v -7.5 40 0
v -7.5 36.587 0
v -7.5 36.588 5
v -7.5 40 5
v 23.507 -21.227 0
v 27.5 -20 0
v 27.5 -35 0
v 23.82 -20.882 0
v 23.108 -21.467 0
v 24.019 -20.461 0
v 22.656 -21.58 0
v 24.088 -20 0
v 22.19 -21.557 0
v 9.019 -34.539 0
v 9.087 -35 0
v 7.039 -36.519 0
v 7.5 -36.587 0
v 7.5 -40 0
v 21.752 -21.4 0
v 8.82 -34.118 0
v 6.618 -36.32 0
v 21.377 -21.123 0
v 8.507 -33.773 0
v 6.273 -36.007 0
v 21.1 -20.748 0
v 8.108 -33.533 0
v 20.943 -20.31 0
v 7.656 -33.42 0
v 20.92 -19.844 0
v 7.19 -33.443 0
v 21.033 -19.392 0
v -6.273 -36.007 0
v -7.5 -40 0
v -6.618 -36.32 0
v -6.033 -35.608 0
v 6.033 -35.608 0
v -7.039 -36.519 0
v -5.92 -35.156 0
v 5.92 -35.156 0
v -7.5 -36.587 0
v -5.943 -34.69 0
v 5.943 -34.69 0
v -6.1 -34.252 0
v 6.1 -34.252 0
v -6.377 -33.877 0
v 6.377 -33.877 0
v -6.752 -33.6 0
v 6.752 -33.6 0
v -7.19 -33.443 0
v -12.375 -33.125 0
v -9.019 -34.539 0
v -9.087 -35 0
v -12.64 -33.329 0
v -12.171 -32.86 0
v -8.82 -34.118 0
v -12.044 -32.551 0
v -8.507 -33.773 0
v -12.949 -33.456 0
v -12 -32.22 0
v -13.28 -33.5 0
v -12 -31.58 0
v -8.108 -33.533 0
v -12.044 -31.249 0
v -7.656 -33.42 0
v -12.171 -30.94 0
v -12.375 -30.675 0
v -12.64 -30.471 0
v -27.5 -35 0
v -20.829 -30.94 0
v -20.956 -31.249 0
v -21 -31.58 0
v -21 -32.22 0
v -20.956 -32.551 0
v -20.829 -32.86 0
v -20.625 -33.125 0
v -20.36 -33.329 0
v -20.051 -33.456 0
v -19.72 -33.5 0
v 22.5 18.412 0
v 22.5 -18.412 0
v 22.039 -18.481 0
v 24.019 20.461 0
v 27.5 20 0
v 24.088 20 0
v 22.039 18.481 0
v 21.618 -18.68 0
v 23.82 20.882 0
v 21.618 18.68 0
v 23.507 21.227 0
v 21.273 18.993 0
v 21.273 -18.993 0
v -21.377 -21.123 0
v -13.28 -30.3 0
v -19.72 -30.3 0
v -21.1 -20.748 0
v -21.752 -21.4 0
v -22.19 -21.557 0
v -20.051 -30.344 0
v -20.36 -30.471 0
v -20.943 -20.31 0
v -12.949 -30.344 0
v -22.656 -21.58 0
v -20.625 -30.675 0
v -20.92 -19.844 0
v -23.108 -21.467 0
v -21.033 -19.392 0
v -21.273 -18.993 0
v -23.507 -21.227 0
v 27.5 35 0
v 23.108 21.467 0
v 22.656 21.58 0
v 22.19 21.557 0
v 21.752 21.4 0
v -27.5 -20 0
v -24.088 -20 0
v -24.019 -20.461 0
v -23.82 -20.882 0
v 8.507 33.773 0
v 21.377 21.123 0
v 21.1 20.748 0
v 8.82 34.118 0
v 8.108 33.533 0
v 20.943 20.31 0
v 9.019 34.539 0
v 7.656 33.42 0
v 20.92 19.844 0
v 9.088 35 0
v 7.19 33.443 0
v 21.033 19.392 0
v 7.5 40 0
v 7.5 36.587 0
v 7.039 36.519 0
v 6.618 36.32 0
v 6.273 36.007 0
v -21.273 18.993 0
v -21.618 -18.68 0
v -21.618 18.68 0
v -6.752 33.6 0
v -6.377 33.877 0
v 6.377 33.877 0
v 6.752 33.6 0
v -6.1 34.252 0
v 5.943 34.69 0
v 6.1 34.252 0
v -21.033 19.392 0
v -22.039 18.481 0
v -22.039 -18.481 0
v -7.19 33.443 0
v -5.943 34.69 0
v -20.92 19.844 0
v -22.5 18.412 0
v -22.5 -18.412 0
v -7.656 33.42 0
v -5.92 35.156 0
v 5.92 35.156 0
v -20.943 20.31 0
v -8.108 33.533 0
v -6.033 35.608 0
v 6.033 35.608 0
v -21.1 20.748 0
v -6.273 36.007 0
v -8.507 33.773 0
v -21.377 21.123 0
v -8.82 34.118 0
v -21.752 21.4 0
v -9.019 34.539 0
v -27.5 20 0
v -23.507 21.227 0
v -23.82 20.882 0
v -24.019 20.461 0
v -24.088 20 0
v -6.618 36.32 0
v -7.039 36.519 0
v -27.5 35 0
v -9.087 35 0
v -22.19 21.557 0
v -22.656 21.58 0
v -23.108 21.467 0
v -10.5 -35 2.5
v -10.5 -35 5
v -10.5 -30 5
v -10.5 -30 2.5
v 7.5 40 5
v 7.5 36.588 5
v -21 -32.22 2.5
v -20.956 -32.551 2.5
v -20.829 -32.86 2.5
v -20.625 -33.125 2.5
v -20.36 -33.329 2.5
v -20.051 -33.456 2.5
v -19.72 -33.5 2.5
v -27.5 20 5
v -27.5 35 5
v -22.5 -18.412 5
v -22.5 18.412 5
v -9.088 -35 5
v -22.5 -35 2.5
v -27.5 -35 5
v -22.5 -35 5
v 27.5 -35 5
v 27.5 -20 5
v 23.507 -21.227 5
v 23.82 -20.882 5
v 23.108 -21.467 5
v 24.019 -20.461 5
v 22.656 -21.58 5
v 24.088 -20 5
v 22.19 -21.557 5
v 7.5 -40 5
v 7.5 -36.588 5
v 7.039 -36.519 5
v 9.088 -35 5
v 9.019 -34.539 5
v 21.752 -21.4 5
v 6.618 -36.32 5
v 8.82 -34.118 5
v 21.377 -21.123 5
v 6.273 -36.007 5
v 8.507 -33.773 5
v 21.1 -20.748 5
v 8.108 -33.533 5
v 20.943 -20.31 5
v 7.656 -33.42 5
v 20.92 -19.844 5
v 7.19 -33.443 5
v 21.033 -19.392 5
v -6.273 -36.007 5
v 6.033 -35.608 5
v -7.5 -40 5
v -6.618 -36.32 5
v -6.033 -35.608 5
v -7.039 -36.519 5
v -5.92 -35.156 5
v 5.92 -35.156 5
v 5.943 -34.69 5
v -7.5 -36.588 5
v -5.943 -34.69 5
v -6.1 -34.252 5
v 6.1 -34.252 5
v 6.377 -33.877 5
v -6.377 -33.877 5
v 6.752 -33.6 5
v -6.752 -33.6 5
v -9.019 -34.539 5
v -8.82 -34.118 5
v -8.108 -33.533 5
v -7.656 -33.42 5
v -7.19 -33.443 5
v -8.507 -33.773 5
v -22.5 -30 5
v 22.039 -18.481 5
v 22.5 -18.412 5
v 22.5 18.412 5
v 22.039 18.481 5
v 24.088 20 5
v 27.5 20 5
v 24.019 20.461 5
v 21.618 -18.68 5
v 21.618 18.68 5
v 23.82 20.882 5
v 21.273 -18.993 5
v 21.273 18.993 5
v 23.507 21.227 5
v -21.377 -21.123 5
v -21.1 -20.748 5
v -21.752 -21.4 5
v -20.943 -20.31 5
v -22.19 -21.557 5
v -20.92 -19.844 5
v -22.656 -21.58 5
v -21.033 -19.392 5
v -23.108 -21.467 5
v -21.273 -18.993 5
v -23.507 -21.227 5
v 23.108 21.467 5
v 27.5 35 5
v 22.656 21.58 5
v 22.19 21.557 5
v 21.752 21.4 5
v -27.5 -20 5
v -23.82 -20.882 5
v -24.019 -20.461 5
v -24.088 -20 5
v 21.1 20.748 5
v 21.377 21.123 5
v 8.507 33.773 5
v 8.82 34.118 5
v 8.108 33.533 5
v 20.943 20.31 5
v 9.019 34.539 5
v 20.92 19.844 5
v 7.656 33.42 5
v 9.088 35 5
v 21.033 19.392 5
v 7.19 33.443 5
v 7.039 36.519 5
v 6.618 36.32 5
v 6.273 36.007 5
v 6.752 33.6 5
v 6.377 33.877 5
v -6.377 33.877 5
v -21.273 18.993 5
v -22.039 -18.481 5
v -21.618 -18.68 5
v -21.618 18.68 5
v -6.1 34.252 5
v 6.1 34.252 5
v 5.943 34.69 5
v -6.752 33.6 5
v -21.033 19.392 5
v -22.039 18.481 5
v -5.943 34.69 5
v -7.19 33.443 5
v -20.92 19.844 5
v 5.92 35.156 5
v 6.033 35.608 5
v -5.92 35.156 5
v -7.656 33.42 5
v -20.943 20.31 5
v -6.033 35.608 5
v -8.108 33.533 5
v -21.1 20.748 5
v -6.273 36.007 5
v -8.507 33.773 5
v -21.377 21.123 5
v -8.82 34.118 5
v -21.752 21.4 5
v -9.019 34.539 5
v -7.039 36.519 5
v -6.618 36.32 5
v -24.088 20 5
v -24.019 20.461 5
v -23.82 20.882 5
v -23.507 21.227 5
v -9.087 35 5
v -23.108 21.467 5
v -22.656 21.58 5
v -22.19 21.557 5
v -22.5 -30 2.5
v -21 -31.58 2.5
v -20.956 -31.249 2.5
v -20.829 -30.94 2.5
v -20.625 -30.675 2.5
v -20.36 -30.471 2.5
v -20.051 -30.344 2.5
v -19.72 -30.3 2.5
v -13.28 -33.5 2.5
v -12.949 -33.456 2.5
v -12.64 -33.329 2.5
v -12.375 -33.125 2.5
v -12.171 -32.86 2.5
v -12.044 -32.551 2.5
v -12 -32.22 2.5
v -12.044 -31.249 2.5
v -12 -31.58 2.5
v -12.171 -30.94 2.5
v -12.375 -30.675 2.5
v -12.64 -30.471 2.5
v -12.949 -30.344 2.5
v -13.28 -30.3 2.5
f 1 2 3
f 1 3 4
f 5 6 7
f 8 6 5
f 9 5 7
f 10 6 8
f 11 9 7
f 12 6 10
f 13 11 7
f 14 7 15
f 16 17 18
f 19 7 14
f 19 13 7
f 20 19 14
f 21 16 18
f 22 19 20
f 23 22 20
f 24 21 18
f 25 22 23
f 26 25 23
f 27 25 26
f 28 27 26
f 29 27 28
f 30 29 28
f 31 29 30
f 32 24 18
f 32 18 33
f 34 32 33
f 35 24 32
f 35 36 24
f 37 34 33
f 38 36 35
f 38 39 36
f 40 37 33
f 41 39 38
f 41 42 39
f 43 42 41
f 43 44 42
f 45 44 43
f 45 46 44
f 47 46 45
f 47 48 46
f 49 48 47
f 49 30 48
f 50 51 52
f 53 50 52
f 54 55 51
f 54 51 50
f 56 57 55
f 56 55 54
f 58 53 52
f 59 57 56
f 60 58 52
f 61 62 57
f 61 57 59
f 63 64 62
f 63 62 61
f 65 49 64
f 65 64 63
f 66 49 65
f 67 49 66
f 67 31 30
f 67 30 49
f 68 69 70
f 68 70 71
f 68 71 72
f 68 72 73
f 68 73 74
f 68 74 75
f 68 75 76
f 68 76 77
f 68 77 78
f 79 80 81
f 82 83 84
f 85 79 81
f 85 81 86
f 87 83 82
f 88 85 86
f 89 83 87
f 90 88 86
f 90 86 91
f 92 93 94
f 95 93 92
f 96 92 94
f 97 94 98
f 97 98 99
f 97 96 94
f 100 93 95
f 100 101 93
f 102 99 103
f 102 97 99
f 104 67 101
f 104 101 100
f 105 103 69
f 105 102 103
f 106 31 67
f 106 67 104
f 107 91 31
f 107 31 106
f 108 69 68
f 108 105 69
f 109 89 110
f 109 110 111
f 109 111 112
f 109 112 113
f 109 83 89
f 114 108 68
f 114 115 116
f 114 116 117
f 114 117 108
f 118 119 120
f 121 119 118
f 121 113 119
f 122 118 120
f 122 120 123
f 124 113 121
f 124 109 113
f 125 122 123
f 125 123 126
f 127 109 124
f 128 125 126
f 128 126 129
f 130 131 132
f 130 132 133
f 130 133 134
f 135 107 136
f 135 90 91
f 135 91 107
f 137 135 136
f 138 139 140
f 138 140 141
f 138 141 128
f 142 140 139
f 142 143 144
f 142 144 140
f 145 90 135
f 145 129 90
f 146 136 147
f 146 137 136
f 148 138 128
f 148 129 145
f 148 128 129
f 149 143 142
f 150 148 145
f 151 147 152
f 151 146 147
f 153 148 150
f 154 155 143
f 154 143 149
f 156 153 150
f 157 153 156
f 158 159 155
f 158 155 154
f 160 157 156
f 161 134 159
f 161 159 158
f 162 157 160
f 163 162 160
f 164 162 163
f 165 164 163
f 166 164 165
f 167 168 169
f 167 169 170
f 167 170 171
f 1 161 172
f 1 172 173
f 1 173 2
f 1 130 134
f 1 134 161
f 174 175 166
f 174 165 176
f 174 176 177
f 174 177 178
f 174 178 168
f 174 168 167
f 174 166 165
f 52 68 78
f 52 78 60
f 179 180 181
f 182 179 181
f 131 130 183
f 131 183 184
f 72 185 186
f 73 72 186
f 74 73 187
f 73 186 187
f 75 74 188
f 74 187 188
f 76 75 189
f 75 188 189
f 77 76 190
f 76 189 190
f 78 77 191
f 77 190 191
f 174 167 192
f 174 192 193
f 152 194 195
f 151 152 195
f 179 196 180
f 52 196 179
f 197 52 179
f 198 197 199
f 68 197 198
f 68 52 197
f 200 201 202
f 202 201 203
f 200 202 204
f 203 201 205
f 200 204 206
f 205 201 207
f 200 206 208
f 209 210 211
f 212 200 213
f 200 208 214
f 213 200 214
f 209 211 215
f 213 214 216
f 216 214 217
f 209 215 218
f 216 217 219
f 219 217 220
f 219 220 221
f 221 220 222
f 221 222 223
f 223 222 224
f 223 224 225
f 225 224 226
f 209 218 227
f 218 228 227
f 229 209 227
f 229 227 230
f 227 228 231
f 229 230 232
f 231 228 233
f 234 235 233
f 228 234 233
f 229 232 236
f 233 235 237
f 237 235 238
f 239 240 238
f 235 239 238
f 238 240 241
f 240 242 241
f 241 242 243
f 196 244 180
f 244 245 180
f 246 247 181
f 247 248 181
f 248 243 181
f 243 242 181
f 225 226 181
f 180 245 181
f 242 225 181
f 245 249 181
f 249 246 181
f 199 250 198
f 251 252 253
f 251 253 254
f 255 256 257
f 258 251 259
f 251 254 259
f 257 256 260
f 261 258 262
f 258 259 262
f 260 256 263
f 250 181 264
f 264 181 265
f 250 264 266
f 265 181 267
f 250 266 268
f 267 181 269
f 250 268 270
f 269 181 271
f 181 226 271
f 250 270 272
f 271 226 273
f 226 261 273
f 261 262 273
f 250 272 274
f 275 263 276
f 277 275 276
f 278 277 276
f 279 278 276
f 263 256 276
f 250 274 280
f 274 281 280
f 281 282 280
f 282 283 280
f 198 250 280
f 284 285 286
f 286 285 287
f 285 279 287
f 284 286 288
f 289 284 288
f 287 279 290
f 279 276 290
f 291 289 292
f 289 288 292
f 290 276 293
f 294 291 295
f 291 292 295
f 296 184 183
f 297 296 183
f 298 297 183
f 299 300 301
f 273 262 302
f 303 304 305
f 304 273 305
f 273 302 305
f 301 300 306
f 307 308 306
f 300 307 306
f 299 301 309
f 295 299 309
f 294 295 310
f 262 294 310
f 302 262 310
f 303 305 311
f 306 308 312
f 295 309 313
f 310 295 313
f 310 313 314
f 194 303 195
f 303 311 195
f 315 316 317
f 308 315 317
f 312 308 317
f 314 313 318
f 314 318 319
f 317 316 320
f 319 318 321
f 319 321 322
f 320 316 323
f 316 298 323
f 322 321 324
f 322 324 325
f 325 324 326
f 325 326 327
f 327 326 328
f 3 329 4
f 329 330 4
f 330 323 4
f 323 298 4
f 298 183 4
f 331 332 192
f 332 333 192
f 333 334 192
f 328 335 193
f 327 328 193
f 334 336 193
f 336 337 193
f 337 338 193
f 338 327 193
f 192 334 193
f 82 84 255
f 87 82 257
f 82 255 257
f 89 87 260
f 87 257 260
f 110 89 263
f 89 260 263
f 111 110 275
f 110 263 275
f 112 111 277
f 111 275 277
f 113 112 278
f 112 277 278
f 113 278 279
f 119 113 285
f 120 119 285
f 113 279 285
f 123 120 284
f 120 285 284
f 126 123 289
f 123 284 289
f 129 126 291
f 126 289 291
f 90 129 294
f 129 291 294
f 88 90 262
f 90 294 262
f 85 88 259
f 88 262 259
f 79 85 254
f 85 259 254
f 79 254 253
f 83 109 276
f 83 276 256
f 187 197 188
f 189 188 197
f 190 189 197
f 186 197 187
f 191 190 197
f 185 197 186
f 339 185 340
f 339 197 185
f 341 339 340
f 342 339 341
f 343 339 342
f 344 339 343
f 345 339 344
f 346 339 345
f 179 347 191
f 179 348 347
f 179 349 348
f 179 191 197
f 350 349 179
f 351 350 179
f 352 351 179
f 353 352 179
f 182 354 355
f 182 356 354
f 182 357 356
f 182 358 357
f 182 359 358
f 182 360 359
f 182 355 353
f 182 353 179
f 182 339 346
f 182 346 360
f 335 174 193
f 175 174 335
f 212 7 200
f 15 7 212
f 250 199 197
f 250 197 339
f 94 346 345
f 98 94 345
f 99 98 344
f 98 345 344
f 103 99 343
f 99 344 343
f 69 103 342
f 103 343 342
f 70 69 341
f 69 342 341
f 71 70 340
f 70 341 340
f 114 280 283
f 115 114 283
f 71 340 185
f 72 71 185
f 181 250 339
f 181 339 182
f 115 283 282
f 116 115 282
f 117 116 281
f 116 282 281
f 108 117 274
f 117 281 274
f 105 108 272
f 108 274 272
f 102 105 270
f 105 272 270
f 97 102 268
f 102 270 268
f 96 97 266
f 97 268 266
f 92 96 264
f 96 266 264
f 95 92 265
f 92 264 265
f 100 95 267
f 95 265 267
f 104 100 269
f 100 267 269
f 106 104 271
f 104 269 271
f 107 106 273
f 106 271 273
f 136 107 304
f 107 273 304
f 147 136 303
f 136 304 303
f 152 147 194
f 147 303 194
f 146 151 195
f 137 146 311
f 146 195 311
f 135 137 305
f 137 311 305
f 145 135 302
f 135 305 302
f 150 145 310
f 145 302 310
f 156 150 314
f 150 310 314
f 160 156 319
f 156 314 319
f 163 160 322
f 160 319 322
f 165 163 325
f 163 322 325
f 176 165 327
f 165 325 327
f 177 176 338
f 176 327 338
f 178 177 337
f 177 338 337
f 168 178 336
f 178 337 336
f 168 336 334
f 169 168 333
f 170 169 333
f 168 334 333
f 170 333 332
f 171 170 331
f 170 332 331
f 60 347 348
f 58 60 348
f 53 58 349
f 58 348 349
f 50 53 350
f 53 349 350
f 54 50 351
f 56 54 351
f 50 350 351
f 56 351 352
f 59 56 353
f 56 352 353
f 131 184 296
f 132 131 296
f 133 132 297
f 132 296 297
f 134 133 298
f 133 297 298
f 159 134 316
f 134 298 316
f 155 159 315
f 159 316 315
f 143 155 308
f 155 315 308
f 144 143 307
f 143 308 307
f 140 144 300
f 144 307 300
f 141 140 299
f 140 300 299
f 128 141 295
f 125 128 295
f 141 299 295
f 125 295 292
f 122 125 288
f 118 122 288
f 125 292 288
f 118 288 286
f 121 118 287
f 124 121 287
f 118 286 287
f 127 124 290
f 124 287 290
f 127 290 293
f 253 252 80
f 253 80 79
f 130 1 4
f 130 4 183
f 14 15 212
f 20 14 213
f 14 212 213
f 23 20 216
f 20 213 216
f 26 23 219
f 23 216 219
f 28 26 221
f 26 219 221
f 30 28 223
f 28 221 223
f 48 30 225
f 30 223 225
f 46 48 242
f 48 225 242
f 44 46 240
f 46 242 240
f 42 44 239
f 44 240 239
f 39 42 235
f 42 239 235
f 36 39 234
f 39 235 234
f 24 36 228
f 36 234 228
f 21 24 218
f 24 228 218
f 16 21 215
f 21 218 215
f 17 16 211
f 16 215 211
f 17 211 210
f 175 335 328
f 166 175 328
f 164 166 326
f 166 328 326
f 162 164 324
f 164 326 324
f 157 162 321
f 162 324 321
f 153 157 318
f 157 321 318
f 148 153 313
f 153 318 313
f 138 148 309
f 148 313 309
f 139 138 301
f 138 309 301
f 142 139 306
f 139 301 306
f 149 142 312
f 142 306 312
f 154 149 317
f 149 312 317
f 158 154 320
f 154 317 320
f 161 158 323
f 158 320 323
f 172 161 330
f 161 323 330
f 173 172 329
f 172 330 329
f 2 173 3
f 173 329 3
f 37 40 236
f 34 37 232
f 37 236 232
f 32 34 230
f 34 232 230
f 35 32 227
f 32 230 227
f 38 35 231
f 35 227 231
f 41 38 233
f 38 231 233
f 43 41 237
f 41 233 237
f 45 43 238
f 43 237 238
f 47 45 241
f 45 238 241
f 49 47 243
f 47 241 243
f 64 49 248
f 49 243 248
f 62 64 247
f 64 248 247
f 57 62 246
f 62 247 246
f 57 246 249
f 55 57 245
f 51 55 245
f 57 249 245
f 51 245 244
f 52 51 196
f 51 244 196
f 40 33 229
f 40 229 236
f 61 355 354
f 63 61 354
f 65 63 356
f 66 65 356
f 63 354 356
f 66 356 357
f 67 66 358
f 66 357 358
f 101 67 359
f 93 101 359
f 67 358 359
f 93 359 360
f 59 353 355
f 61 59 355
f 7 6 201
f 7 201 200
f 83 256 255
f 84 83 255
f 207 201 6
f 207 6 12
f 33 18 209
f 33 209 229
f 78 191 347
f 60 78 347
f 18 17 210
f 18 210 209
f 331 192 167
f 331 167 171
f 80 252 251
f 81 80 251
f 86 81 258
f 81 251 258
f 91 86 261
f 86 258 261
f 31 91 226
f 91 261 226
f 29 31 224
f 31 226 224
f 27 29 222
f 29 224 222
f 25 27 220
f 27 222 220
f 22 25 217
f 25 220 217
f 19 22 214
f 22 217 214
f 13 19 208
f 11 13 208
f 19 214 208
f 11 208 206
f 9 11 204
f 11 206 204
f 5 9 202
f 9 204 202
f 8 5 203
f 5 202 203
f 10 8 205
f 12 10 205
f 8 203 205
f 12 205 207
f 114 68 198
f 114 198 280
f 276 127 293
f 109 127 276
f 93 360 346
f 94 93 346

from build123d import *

# Parameters (mm, degrees)
BOSS_EXTRUDE2_DEPTH = 5
SKETCH3_W           = 5
SKETCH3_H           = 40
CUT_EXTRUDE1_DEPTH  = 5
SKETCH5_W           = 12
SKETCH5_H           = 5
CUT_EXTRUDE2_DEPTH  = 2.5
CUT_EXTRUDE3_DEPTH  = 3.5
SKETCH7_R           = 1.5875
CUT_EXTRUDE4_DEPTH  = 6


with BuildPart() as part:
    # Sketch2 → Boss-Extrude2 (new body)
    with BuildSketch(Plane.XY):
        Polygon((-7.5, 40), (7.5, 40), (7.5, 35), (27.5, 35), (27.5, -35), (7.5, -35), (7.5, -40), (-7.5, -40), (-7.5, -35), (-27.5, -35), (-27.5, 35), (-7.5, 35), align=None)
    extrude(amount=BOSS_EXTRUDE2_DEPTH)

    # Sketch3 → Cut-Extrude1 (cut)
    with BuildSketch(Plane.XY.offset(5)):
        with Locations((-25, 0)):
            Rectangle(SKETCH3_W, SKETCH3_H)
    cut_extrude1 = extrude(amount=-CUT_EXTRUDE1_DEPTH, mode=Mode.SUBTRACT)

    # Mirror1: Cut-Extrude1 across plane
    add(cut_extrude1.mirror(Plane(origin=(0, 0, 0), x_dir=(0, 0, 1), z_dir=(1, 0, 0))), mode=Mode.SUBTRACT)

    # Sketch5 → Cut-Extrude2 (cut)
    with BuildSketch(Plane.XY.offset(5)):
        with Locations((-16.5, -32.5)):
            Rectangle(SKETCH5_W, SKETCH5_H)
    extrude(amount=-CUT_EXTRUDE2_DEPTH, mode=Mode.SUBTRACT)

    # Sketch6 → Cut-Extrude3 (cut, through all)
    with BuildSketch(Plane.XY.offset(2.5)):
        with BuildLine():
            Line((-19.72, -33.5), (-13.28, -33.5))
            ThreePointArc((-13.28, -33.5), (-12.37490332, -33.12509668), (-12, -32.22))
            Line((-12, -32.22), (-12, -31.58))
            ThreePointArc((-12, -31.58), (-12.37490332, -30.67490332), (-13.28, -30.3))
            Line((-13.28, -30.3), (-19.72, -30.3))
            ThreePointArc((-19.72, -30.3), (-20.62509668, -30.67490332), (-21, -31.58))
            Line((-21, -31.58), (-21, -32.22))
            ThreePointArc((-21, -32.22), (-20.62509668, -33.12509668), (-19.72, -33.5))
        make_face()
    extrude(amount=-CUT_EXTRUDE3_DEPTH, mode=Mode.SUBTRACT)

    # Sketch7 → Cut-Extrude4 (cut, through all)
    with BuildSketch(Plane.XY.offset(5)):
        with Locations((-7.5, 35)):
            Circle(SKETCH7_R)
        with Locations((7.5, 35)):
            Circle(SKETCH7_R)
        with Locations((22.5, 20)):
            Circle(SKETCH7_R)
        with Locations((-22.5, 20)):
            Circle(SKETCH7_R)
        with Locations((-22.5, -20)):
            Circle(SKETCH7_R)
        with Locations((-7.5, -35)):
            Circle(SKETCH7_R)
        with Locations((7.5, -35)):
            Circle(SKETCH7_R)
        with Locations((22.5, -20)):
            Circle(SKETCH7_R)
    extrude(amount=-CUT_EXTRUDE4_DEPTH, mode=Mode.SUBTRACT)


solid = part.part
